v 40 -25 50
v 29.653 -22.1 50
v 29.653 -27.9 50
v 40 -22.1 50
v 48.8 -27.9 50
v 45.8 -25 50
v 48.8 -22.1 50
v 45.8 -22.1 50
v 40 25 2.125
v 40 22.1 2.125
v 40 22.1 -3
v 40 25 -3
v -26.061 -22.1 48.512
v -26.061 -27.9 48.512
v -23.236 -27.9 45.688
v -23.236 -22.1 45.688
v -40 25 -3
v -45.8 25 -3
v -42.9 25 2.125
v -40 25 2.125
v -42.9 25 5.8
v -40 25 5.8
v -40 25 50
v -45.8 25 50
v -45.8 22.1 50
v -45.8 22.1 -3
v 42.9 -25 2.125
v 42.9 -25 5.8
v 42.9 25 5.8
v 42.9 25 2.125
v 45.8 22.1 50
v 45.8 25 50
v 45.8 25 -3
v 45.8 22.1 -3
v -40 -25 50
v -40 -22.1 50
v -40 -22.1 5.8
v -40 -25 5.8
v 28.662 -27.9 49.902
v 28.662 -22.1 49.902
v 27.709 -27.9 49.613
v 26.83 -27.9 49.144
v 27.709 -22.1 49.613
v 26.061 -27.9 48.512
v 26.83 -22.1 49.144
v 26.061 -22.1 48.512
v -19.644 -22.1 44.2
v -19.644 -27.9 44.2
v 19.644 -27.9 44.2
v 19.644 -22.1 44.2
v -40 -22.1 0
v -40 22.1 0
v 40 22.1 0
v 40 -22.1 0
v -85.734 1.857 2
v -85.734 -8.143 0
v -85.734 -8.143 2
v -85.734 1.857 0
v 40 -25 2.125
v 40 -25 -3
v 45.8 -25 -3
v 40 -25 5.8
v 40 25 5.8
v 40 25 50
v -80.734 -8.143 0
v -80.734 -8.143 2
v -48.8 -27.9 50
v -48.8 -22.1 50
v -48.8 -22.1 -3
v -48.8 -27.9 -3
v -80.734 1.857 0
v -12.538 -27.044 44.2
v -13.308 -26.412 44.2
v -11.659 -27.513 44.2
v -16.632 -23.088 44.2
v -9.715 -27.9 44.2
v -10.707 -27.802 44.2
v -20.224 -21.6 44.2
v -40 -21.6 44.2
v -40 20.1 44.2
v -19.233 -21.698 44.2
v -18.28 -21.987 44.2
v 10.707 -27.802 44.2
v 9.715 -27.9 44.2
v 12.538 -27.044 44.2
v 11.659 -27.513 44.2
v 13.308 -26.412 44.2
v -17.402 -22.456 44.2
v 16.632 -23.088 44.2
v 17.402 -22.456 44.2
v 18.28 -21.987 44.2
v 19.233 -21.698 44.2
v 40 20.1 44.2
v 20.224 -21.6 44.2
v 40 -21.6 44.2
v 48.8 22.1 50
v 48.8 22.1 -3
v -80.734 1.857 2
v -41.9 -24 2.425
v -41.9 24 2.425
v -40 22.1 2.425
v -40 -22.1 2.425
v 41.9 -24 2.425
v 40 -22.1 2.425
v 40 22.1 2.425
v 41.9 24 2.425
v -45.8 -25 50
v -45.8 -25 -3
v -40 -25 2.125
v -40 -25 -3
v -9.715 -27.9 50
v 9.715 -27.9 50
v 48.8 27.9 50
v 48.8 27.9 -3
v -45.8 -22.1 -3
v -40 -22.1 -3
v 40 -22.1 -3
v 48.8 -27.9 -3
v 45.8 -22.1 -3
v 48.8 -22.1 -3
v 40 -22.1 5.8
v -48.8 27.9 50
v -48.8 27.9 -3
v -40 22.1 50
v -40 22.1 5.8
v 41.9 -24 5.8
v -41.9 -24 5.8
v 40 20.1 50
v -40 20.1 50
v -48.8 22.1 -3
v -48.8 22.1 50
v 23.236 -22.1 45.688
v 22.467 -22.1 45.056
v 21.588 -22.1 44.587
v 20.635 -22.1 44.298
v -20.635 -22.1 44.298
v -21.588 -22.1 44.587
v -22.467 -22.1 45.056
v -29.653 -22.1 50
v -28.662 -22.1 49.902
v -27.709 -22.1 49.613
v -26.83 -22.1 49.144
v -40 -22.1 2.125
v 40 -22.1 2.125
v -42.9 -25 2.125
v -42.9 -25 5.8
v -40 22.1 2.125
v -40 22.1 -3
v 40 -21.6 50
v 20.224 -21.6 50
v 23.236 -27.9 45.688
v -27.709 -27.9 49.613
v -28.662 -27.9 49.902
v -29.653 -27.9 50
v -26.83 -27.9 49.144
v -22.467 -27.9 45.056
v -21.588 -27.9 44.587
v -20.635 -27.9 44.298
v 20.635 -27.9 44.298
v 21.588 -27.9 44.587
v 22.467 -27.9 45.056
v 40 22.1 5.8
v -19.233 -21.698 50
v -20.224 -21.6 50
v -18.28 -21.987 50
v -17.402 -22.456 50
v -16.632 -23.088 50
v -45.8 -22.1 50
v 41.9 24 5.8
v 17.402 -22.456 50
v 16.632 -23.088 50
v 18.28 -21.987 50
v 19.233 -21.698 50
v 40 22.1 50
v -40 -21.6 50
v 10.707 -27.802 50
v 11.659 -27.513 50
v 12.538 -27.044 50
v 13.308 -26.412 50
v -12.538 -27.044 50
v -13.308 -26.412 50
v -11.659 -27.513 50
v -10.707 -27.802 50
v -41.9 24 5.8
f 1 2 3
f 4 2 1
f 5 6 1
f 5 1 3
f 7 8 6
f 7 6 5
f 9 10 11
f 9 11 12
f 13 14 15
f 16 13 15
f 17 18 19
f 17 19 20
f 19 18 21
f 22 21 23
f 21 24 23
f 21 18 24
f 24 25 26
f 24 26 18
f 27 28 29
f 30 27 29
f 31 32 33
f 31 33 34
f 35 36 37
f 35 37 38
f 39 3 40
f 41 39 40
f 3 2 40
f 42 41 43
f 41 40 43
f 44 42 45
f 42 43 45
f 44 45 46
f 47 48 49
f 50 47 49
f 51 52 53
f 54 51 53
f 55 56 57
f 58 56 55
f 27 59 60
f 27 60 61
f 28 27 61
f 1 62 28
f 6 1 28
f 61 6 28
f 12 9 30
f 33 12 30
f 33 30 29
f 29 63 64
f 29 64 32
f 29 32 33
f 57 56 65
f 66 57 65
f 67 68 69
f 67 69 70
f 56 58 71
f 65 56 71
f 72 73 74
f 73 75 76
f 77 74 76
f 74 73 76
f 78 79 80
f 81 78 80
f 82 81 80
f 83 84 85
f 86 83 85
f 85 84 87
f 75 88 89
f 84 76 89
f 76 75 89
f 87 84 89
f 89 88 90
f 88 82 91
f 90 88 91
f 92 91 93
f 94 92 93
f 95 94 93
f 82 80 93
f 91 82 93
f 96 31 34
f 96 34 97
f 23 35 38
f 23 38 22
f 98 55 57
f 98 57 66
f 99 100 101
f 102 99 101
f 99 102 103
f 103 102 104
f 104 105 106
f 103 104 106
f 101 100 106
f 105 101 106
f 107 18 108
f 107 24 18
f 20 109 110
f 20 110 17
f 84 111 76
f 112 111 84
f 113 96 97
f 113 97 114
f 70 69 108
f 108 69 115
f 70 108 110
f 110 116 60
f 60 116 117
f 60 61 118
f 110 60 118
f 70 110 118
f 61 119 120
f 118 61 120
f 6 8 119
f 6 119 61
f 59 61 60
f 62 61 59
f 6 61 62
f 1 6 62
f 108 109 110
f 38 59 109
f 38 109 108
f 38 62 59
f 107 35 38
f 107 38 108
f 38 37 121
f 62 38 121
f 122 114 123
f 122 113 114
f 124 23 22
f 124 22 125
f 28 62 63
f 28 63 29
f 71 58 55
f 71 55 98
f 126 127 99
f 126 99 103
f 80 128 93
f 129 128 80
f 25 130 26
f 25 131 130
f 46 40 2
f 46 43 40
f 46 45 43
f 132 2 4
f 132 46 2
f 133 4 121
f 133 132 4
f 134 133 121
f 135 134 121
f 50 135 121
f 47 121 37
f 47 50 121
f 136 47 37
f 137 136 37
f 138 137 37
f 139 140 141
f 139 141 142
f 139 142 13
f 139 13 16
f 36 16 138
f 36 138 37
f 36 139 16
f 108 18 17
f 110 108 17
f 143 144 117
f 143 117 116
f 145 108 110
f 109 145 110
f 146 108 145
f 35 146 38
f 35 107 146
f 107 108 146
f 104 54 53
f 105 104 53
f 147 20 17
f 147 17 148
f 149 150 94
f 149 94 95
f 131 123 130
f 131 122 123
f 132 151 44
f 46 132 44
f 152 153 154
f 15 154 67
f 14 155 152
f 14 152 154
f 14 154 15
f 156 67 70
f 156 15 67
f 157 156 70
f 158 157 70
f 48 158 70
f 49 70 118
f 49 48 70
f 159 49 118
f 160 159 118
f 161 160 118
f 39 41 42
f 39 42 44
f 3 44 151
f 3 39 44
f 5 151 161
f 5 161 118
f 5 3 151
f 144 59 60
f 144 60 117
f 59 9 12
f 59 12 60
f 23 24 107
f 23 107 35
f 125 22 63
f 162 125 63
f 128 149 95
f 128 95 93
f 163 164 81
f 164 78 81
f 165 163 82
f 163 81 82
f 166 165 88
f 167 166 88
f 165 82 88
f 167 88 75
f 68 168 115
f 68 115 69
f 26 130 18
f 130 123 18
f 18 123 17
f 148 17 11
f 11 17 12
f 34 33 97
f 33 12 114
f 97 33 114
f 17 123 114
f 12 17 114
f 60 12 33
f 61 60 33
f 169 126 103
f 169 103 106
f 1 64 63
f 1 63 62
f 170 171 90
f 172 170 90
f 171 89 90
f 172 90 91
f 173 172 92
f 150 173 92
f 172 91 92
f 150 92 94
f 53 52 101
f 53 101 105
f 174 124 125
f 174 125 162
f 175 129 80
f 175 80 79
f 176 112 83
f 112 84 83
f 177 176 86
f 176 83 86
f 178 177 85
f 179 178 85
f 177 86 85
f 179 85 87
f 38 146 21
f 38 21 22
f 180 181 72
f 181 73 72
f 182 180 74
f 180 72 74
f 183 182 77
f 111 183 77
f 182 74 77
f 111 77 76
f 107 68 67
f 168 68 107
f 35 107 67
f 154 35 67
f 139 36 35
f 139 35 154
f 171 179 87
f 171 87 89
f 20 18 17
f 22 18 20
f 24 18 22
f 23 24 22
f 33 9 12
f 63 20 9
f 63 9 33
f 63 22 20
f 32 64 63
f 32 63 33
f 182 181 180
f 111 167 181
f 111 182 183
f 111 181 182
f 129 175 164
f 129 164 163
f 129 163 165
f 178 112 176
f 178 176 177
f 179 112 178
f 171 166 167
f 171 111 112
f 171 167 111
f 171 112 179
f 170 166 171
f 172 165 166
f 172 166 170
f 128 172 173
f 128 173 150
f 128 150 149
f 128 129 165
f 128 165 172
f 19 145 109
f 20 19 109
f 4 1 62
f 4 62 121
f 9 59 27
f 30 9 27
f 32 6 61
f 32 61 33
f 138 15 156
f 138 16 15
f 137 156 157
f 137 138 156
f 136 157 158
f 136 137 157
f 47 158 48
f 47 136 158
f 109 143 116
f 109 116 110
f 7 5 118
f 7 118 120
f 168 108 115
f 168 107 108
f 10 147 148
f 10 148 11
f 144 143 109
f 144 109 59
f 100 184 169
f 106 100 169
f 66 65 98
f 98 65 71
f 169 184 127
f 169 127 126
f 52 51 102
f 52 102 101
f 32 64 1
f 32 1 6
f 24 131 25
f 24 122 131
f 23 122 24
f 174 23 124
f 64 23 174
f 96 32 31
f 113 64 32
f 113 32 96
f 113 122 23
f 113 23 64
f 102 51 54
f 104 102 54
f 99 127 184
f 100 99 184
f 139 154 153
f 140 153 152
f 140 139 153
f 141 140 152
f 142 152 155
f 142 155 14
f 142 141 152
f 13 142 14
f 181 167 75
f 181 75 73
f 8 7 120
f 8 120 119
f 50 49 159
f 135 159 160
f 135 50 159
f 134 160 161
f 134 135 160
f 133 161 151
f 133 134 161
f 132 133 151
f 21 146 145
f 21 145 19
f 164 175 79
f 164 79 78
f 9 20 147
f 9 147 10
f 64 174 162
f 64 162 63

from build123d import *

# Parameters (mm, degrees)
F6_DEPTH      = 50
F6_DEPTH_BACK = 3
F5_W          = 5.8
F5_H          = 2.9
F5_H_2        = 44.2
F7_DEPTH      = 50
F7_DEPTH_BACK = 3
F5_W_2        = 80
F8_DEPTH      = 5.8
F9_W          = 85.8
F9_H          = 50
F9_W_2        = 83.8
F9_H_2        = 48
F9_W_3        = 80
F9_H_3        = 44.2
F10_DEPTH     = 3.675
F11_DEPTH     = 3.375
F13_DEPTH     = 5.8
F15_DEPTH     = 25.4
F16_R         = 5.08
F16_2_R       = 5.08
F17_W         = 5
F17_H         = 10
F18_DEPTH     = 2


# Not quite as in the source:
# - a length typed as a fraction of an inch, garbled in the dataset ("3 / 203.2 mm" for 3/8 in), is restored


with BuildPart() as f6:
    # F5 (on Top) → F6 (new body, two sides)
    with BuildSketch(Plane.XY) as f6_sk:
        Polygon((-48.8, 22.1), (-45.8, 22.1), (-45.8, 25), (-40, 25), (-40, 22.1), (40, 22.1), (40, 25), (45.8, 25), (45.8, 22.1), (48.8, 22.1), (48.8, 27.9), (-48.8, 27.9), align=None)
    extrude(amount=F6_DEPTH)
    extrude(f6_sk.sketch, amount=-F6_DEPTH_BACK)


with BuildPart() as f6b:
    # F5 (on Top) → F6, piece 2 (new body, two sides)
    with BuildSketch(Plane.XY) as f6_2_sk:
        Polygon((-45.8, -25), (-45.8, -22.1), (-48.8, -22.1), (-48.8, -27.9), (48.8, -27.9), (48.8, -22.1), (45.8, -22.1), (45.8, -25), (40, -25), (40, -22.1), (-40, -22.1), (-40, -25), align=None)
    extrude(amount=F6_DEPTH)
    extrude(f6_2_sk.sketch, amount=-F6_DEPTH_BACK)


with BuildPart() as f7:
    # F5 (on Top) → F7 (new body, two sides)
    with BuildSketch(Plane.XY) as f7_sk:
        with Locations((-42.9, 23.55)):
            Rectangle(F5_W, F5_H)
        with Locations((-42.9, 0)):
            Rectangle(F5_W, F5_H_2)
        with Locations((-42.9, -23.55)):
            Rectangle(F5_W, F5_H)
    extrude(amount=F7_DEPTH)
    extrude(f7_sk.sketch, amount=-F7_DEPTH_BACK)


with BuildPart() as f7b:
    # F5 (on Top) → F7, piece 2 (new body, two sides)
    with BuildSketch(Plane.XY) as f7_2_sk:
        with Locations((42.9, 23.55)):
            Rectangle(F5_W, F5_H)
        with Locations((42.9, 0)):
            Rectangle(F5_W, F5_H_2)
        with Locations((42.9, -23.55)):
            Rectangle(F5_W, F5_H)
    extrude(amount=F7_DEPTH)
    extrude(f7_2_sk.sketch, amount=-F7_DEPTH_BACK)


with BuildPart() as f8:
    # F5 (on Top) → F8 (new body)
    with BuildSketch(Plane.XY):
        Rectangle(F5_W_2, F5_H_2)
    extrude(amount=F8_DEPTH)

    # F9 (on face) → F11 (join)
    with BuildSketch(Plane.XY.offset(5.8)):
        Rectangle(F9_W_2, F9_H_2)
        Rectangle(F9_W_3, F9_H_3, mode=Mode.SUBTRACT)
    extrude(amount=-F11_DEPTH)


with BuildPart() as f10_tool:
    # F9 (on face) → F10 (new body)
    with BuildSketch(Plane.XY.offset(5.8)):
        Rectangle(F9_W, F9_H)
        Rectangle(F9_W_2, F9_H_2, mode=Mode.SUBTRACT)
        Rectangle(F9_W_2, F9_H_2)
        Rectangle(F9_W_3, F9_H_3, mode=Mode.SUBTRACT)
    extrude(amount=-F10_DEPTH)


with BuildPart() as f6_1:
    add(f6.part)

    # F10: cut by f10_tool
    add(f10_tool.part, mode=Mode.SUBTRACT)


with BuildPart() as f6b_1:
    add(f6b.part)

    # F10: cut by f10_tool
    add(f10_tool.part, mode=Mode.SUBTRACT)

    # F14 (on face) → F15 (cut)
    with BuildSketch(Plane.XZ.offset(27.9)):
        Polygon((0, 50), (-27.5484826416, 50), (-21.7484826416, 44.2), (0, 44.2), (21.7484826416, 44.2), (27.5484826416, 50), align=None)
    extrude(amount=-F15_DEPTH, mode=Mode.SUBTRACT)

    # F16
    f16_edges = [f6b_1.edges().sort_by_distance(p)[0] for p in [
        (-27.548483, -25, 50),
        (-21.748483, -25, 44.2),
        (21.748483, -25, 44.2),
        (27.548483, -25, 50),
    ]]
    fillet(f16_edges, radius=F16_R)


with BuildPart() as f7_1:
    add(f7.part)

    # F10: cut by f10_tool
    add(f10_tool.part, mode=Mode.SUBTRACT)


with BuildPart() as f7b_1:
    add(f7b.part)

    # F10: cut by f10_tool
    add(f10_tool.part, mode=Mode.SUBTRACT)


with BuildPart() as f13:
    # F12 (on face) → F13 (new body)
    with BuildSketch(Plane.XY.offset(50)):
        Polygon((40, 20.1), (-40, 20.1), (-40, -21.6), (-18.1196574122, -21.6), (-11.8196574122, -27.9), (0, -27.9), (11.8196574122, -27.9), (18.1196574122, -21.6), (40, -21.6), align=None)
    extrude(amount=-F13_DEPTH)

    # F16#2
    f16_2_edges = [f13.edges().sort_by_distance(p)[0] for p in [
        (18.119657, -21.6, 47.1),
        (11.819657, -27.9, 47.1),
        (-11.819657, -27.9, 47.1),
        (-18.119657, -21.6, 47.1),
    ]]
    fillet(f16_2_edges, radius=F16_2_R)


with BuildPart() as f18:
    # F17 (on Top) → F18 (new body)
    with BuildSketch(Plane.XY):
        with Locations((-83.2338705659, -3.1428090297)):
            Rectangle(F17_W, F17_H)
    extrude(amount=F18_DEPTH)


solid = Compound([f8.part, f6_1.part, f6b_1.part, f7_1.part, f7b_1.part, f13.part, f18.part])
